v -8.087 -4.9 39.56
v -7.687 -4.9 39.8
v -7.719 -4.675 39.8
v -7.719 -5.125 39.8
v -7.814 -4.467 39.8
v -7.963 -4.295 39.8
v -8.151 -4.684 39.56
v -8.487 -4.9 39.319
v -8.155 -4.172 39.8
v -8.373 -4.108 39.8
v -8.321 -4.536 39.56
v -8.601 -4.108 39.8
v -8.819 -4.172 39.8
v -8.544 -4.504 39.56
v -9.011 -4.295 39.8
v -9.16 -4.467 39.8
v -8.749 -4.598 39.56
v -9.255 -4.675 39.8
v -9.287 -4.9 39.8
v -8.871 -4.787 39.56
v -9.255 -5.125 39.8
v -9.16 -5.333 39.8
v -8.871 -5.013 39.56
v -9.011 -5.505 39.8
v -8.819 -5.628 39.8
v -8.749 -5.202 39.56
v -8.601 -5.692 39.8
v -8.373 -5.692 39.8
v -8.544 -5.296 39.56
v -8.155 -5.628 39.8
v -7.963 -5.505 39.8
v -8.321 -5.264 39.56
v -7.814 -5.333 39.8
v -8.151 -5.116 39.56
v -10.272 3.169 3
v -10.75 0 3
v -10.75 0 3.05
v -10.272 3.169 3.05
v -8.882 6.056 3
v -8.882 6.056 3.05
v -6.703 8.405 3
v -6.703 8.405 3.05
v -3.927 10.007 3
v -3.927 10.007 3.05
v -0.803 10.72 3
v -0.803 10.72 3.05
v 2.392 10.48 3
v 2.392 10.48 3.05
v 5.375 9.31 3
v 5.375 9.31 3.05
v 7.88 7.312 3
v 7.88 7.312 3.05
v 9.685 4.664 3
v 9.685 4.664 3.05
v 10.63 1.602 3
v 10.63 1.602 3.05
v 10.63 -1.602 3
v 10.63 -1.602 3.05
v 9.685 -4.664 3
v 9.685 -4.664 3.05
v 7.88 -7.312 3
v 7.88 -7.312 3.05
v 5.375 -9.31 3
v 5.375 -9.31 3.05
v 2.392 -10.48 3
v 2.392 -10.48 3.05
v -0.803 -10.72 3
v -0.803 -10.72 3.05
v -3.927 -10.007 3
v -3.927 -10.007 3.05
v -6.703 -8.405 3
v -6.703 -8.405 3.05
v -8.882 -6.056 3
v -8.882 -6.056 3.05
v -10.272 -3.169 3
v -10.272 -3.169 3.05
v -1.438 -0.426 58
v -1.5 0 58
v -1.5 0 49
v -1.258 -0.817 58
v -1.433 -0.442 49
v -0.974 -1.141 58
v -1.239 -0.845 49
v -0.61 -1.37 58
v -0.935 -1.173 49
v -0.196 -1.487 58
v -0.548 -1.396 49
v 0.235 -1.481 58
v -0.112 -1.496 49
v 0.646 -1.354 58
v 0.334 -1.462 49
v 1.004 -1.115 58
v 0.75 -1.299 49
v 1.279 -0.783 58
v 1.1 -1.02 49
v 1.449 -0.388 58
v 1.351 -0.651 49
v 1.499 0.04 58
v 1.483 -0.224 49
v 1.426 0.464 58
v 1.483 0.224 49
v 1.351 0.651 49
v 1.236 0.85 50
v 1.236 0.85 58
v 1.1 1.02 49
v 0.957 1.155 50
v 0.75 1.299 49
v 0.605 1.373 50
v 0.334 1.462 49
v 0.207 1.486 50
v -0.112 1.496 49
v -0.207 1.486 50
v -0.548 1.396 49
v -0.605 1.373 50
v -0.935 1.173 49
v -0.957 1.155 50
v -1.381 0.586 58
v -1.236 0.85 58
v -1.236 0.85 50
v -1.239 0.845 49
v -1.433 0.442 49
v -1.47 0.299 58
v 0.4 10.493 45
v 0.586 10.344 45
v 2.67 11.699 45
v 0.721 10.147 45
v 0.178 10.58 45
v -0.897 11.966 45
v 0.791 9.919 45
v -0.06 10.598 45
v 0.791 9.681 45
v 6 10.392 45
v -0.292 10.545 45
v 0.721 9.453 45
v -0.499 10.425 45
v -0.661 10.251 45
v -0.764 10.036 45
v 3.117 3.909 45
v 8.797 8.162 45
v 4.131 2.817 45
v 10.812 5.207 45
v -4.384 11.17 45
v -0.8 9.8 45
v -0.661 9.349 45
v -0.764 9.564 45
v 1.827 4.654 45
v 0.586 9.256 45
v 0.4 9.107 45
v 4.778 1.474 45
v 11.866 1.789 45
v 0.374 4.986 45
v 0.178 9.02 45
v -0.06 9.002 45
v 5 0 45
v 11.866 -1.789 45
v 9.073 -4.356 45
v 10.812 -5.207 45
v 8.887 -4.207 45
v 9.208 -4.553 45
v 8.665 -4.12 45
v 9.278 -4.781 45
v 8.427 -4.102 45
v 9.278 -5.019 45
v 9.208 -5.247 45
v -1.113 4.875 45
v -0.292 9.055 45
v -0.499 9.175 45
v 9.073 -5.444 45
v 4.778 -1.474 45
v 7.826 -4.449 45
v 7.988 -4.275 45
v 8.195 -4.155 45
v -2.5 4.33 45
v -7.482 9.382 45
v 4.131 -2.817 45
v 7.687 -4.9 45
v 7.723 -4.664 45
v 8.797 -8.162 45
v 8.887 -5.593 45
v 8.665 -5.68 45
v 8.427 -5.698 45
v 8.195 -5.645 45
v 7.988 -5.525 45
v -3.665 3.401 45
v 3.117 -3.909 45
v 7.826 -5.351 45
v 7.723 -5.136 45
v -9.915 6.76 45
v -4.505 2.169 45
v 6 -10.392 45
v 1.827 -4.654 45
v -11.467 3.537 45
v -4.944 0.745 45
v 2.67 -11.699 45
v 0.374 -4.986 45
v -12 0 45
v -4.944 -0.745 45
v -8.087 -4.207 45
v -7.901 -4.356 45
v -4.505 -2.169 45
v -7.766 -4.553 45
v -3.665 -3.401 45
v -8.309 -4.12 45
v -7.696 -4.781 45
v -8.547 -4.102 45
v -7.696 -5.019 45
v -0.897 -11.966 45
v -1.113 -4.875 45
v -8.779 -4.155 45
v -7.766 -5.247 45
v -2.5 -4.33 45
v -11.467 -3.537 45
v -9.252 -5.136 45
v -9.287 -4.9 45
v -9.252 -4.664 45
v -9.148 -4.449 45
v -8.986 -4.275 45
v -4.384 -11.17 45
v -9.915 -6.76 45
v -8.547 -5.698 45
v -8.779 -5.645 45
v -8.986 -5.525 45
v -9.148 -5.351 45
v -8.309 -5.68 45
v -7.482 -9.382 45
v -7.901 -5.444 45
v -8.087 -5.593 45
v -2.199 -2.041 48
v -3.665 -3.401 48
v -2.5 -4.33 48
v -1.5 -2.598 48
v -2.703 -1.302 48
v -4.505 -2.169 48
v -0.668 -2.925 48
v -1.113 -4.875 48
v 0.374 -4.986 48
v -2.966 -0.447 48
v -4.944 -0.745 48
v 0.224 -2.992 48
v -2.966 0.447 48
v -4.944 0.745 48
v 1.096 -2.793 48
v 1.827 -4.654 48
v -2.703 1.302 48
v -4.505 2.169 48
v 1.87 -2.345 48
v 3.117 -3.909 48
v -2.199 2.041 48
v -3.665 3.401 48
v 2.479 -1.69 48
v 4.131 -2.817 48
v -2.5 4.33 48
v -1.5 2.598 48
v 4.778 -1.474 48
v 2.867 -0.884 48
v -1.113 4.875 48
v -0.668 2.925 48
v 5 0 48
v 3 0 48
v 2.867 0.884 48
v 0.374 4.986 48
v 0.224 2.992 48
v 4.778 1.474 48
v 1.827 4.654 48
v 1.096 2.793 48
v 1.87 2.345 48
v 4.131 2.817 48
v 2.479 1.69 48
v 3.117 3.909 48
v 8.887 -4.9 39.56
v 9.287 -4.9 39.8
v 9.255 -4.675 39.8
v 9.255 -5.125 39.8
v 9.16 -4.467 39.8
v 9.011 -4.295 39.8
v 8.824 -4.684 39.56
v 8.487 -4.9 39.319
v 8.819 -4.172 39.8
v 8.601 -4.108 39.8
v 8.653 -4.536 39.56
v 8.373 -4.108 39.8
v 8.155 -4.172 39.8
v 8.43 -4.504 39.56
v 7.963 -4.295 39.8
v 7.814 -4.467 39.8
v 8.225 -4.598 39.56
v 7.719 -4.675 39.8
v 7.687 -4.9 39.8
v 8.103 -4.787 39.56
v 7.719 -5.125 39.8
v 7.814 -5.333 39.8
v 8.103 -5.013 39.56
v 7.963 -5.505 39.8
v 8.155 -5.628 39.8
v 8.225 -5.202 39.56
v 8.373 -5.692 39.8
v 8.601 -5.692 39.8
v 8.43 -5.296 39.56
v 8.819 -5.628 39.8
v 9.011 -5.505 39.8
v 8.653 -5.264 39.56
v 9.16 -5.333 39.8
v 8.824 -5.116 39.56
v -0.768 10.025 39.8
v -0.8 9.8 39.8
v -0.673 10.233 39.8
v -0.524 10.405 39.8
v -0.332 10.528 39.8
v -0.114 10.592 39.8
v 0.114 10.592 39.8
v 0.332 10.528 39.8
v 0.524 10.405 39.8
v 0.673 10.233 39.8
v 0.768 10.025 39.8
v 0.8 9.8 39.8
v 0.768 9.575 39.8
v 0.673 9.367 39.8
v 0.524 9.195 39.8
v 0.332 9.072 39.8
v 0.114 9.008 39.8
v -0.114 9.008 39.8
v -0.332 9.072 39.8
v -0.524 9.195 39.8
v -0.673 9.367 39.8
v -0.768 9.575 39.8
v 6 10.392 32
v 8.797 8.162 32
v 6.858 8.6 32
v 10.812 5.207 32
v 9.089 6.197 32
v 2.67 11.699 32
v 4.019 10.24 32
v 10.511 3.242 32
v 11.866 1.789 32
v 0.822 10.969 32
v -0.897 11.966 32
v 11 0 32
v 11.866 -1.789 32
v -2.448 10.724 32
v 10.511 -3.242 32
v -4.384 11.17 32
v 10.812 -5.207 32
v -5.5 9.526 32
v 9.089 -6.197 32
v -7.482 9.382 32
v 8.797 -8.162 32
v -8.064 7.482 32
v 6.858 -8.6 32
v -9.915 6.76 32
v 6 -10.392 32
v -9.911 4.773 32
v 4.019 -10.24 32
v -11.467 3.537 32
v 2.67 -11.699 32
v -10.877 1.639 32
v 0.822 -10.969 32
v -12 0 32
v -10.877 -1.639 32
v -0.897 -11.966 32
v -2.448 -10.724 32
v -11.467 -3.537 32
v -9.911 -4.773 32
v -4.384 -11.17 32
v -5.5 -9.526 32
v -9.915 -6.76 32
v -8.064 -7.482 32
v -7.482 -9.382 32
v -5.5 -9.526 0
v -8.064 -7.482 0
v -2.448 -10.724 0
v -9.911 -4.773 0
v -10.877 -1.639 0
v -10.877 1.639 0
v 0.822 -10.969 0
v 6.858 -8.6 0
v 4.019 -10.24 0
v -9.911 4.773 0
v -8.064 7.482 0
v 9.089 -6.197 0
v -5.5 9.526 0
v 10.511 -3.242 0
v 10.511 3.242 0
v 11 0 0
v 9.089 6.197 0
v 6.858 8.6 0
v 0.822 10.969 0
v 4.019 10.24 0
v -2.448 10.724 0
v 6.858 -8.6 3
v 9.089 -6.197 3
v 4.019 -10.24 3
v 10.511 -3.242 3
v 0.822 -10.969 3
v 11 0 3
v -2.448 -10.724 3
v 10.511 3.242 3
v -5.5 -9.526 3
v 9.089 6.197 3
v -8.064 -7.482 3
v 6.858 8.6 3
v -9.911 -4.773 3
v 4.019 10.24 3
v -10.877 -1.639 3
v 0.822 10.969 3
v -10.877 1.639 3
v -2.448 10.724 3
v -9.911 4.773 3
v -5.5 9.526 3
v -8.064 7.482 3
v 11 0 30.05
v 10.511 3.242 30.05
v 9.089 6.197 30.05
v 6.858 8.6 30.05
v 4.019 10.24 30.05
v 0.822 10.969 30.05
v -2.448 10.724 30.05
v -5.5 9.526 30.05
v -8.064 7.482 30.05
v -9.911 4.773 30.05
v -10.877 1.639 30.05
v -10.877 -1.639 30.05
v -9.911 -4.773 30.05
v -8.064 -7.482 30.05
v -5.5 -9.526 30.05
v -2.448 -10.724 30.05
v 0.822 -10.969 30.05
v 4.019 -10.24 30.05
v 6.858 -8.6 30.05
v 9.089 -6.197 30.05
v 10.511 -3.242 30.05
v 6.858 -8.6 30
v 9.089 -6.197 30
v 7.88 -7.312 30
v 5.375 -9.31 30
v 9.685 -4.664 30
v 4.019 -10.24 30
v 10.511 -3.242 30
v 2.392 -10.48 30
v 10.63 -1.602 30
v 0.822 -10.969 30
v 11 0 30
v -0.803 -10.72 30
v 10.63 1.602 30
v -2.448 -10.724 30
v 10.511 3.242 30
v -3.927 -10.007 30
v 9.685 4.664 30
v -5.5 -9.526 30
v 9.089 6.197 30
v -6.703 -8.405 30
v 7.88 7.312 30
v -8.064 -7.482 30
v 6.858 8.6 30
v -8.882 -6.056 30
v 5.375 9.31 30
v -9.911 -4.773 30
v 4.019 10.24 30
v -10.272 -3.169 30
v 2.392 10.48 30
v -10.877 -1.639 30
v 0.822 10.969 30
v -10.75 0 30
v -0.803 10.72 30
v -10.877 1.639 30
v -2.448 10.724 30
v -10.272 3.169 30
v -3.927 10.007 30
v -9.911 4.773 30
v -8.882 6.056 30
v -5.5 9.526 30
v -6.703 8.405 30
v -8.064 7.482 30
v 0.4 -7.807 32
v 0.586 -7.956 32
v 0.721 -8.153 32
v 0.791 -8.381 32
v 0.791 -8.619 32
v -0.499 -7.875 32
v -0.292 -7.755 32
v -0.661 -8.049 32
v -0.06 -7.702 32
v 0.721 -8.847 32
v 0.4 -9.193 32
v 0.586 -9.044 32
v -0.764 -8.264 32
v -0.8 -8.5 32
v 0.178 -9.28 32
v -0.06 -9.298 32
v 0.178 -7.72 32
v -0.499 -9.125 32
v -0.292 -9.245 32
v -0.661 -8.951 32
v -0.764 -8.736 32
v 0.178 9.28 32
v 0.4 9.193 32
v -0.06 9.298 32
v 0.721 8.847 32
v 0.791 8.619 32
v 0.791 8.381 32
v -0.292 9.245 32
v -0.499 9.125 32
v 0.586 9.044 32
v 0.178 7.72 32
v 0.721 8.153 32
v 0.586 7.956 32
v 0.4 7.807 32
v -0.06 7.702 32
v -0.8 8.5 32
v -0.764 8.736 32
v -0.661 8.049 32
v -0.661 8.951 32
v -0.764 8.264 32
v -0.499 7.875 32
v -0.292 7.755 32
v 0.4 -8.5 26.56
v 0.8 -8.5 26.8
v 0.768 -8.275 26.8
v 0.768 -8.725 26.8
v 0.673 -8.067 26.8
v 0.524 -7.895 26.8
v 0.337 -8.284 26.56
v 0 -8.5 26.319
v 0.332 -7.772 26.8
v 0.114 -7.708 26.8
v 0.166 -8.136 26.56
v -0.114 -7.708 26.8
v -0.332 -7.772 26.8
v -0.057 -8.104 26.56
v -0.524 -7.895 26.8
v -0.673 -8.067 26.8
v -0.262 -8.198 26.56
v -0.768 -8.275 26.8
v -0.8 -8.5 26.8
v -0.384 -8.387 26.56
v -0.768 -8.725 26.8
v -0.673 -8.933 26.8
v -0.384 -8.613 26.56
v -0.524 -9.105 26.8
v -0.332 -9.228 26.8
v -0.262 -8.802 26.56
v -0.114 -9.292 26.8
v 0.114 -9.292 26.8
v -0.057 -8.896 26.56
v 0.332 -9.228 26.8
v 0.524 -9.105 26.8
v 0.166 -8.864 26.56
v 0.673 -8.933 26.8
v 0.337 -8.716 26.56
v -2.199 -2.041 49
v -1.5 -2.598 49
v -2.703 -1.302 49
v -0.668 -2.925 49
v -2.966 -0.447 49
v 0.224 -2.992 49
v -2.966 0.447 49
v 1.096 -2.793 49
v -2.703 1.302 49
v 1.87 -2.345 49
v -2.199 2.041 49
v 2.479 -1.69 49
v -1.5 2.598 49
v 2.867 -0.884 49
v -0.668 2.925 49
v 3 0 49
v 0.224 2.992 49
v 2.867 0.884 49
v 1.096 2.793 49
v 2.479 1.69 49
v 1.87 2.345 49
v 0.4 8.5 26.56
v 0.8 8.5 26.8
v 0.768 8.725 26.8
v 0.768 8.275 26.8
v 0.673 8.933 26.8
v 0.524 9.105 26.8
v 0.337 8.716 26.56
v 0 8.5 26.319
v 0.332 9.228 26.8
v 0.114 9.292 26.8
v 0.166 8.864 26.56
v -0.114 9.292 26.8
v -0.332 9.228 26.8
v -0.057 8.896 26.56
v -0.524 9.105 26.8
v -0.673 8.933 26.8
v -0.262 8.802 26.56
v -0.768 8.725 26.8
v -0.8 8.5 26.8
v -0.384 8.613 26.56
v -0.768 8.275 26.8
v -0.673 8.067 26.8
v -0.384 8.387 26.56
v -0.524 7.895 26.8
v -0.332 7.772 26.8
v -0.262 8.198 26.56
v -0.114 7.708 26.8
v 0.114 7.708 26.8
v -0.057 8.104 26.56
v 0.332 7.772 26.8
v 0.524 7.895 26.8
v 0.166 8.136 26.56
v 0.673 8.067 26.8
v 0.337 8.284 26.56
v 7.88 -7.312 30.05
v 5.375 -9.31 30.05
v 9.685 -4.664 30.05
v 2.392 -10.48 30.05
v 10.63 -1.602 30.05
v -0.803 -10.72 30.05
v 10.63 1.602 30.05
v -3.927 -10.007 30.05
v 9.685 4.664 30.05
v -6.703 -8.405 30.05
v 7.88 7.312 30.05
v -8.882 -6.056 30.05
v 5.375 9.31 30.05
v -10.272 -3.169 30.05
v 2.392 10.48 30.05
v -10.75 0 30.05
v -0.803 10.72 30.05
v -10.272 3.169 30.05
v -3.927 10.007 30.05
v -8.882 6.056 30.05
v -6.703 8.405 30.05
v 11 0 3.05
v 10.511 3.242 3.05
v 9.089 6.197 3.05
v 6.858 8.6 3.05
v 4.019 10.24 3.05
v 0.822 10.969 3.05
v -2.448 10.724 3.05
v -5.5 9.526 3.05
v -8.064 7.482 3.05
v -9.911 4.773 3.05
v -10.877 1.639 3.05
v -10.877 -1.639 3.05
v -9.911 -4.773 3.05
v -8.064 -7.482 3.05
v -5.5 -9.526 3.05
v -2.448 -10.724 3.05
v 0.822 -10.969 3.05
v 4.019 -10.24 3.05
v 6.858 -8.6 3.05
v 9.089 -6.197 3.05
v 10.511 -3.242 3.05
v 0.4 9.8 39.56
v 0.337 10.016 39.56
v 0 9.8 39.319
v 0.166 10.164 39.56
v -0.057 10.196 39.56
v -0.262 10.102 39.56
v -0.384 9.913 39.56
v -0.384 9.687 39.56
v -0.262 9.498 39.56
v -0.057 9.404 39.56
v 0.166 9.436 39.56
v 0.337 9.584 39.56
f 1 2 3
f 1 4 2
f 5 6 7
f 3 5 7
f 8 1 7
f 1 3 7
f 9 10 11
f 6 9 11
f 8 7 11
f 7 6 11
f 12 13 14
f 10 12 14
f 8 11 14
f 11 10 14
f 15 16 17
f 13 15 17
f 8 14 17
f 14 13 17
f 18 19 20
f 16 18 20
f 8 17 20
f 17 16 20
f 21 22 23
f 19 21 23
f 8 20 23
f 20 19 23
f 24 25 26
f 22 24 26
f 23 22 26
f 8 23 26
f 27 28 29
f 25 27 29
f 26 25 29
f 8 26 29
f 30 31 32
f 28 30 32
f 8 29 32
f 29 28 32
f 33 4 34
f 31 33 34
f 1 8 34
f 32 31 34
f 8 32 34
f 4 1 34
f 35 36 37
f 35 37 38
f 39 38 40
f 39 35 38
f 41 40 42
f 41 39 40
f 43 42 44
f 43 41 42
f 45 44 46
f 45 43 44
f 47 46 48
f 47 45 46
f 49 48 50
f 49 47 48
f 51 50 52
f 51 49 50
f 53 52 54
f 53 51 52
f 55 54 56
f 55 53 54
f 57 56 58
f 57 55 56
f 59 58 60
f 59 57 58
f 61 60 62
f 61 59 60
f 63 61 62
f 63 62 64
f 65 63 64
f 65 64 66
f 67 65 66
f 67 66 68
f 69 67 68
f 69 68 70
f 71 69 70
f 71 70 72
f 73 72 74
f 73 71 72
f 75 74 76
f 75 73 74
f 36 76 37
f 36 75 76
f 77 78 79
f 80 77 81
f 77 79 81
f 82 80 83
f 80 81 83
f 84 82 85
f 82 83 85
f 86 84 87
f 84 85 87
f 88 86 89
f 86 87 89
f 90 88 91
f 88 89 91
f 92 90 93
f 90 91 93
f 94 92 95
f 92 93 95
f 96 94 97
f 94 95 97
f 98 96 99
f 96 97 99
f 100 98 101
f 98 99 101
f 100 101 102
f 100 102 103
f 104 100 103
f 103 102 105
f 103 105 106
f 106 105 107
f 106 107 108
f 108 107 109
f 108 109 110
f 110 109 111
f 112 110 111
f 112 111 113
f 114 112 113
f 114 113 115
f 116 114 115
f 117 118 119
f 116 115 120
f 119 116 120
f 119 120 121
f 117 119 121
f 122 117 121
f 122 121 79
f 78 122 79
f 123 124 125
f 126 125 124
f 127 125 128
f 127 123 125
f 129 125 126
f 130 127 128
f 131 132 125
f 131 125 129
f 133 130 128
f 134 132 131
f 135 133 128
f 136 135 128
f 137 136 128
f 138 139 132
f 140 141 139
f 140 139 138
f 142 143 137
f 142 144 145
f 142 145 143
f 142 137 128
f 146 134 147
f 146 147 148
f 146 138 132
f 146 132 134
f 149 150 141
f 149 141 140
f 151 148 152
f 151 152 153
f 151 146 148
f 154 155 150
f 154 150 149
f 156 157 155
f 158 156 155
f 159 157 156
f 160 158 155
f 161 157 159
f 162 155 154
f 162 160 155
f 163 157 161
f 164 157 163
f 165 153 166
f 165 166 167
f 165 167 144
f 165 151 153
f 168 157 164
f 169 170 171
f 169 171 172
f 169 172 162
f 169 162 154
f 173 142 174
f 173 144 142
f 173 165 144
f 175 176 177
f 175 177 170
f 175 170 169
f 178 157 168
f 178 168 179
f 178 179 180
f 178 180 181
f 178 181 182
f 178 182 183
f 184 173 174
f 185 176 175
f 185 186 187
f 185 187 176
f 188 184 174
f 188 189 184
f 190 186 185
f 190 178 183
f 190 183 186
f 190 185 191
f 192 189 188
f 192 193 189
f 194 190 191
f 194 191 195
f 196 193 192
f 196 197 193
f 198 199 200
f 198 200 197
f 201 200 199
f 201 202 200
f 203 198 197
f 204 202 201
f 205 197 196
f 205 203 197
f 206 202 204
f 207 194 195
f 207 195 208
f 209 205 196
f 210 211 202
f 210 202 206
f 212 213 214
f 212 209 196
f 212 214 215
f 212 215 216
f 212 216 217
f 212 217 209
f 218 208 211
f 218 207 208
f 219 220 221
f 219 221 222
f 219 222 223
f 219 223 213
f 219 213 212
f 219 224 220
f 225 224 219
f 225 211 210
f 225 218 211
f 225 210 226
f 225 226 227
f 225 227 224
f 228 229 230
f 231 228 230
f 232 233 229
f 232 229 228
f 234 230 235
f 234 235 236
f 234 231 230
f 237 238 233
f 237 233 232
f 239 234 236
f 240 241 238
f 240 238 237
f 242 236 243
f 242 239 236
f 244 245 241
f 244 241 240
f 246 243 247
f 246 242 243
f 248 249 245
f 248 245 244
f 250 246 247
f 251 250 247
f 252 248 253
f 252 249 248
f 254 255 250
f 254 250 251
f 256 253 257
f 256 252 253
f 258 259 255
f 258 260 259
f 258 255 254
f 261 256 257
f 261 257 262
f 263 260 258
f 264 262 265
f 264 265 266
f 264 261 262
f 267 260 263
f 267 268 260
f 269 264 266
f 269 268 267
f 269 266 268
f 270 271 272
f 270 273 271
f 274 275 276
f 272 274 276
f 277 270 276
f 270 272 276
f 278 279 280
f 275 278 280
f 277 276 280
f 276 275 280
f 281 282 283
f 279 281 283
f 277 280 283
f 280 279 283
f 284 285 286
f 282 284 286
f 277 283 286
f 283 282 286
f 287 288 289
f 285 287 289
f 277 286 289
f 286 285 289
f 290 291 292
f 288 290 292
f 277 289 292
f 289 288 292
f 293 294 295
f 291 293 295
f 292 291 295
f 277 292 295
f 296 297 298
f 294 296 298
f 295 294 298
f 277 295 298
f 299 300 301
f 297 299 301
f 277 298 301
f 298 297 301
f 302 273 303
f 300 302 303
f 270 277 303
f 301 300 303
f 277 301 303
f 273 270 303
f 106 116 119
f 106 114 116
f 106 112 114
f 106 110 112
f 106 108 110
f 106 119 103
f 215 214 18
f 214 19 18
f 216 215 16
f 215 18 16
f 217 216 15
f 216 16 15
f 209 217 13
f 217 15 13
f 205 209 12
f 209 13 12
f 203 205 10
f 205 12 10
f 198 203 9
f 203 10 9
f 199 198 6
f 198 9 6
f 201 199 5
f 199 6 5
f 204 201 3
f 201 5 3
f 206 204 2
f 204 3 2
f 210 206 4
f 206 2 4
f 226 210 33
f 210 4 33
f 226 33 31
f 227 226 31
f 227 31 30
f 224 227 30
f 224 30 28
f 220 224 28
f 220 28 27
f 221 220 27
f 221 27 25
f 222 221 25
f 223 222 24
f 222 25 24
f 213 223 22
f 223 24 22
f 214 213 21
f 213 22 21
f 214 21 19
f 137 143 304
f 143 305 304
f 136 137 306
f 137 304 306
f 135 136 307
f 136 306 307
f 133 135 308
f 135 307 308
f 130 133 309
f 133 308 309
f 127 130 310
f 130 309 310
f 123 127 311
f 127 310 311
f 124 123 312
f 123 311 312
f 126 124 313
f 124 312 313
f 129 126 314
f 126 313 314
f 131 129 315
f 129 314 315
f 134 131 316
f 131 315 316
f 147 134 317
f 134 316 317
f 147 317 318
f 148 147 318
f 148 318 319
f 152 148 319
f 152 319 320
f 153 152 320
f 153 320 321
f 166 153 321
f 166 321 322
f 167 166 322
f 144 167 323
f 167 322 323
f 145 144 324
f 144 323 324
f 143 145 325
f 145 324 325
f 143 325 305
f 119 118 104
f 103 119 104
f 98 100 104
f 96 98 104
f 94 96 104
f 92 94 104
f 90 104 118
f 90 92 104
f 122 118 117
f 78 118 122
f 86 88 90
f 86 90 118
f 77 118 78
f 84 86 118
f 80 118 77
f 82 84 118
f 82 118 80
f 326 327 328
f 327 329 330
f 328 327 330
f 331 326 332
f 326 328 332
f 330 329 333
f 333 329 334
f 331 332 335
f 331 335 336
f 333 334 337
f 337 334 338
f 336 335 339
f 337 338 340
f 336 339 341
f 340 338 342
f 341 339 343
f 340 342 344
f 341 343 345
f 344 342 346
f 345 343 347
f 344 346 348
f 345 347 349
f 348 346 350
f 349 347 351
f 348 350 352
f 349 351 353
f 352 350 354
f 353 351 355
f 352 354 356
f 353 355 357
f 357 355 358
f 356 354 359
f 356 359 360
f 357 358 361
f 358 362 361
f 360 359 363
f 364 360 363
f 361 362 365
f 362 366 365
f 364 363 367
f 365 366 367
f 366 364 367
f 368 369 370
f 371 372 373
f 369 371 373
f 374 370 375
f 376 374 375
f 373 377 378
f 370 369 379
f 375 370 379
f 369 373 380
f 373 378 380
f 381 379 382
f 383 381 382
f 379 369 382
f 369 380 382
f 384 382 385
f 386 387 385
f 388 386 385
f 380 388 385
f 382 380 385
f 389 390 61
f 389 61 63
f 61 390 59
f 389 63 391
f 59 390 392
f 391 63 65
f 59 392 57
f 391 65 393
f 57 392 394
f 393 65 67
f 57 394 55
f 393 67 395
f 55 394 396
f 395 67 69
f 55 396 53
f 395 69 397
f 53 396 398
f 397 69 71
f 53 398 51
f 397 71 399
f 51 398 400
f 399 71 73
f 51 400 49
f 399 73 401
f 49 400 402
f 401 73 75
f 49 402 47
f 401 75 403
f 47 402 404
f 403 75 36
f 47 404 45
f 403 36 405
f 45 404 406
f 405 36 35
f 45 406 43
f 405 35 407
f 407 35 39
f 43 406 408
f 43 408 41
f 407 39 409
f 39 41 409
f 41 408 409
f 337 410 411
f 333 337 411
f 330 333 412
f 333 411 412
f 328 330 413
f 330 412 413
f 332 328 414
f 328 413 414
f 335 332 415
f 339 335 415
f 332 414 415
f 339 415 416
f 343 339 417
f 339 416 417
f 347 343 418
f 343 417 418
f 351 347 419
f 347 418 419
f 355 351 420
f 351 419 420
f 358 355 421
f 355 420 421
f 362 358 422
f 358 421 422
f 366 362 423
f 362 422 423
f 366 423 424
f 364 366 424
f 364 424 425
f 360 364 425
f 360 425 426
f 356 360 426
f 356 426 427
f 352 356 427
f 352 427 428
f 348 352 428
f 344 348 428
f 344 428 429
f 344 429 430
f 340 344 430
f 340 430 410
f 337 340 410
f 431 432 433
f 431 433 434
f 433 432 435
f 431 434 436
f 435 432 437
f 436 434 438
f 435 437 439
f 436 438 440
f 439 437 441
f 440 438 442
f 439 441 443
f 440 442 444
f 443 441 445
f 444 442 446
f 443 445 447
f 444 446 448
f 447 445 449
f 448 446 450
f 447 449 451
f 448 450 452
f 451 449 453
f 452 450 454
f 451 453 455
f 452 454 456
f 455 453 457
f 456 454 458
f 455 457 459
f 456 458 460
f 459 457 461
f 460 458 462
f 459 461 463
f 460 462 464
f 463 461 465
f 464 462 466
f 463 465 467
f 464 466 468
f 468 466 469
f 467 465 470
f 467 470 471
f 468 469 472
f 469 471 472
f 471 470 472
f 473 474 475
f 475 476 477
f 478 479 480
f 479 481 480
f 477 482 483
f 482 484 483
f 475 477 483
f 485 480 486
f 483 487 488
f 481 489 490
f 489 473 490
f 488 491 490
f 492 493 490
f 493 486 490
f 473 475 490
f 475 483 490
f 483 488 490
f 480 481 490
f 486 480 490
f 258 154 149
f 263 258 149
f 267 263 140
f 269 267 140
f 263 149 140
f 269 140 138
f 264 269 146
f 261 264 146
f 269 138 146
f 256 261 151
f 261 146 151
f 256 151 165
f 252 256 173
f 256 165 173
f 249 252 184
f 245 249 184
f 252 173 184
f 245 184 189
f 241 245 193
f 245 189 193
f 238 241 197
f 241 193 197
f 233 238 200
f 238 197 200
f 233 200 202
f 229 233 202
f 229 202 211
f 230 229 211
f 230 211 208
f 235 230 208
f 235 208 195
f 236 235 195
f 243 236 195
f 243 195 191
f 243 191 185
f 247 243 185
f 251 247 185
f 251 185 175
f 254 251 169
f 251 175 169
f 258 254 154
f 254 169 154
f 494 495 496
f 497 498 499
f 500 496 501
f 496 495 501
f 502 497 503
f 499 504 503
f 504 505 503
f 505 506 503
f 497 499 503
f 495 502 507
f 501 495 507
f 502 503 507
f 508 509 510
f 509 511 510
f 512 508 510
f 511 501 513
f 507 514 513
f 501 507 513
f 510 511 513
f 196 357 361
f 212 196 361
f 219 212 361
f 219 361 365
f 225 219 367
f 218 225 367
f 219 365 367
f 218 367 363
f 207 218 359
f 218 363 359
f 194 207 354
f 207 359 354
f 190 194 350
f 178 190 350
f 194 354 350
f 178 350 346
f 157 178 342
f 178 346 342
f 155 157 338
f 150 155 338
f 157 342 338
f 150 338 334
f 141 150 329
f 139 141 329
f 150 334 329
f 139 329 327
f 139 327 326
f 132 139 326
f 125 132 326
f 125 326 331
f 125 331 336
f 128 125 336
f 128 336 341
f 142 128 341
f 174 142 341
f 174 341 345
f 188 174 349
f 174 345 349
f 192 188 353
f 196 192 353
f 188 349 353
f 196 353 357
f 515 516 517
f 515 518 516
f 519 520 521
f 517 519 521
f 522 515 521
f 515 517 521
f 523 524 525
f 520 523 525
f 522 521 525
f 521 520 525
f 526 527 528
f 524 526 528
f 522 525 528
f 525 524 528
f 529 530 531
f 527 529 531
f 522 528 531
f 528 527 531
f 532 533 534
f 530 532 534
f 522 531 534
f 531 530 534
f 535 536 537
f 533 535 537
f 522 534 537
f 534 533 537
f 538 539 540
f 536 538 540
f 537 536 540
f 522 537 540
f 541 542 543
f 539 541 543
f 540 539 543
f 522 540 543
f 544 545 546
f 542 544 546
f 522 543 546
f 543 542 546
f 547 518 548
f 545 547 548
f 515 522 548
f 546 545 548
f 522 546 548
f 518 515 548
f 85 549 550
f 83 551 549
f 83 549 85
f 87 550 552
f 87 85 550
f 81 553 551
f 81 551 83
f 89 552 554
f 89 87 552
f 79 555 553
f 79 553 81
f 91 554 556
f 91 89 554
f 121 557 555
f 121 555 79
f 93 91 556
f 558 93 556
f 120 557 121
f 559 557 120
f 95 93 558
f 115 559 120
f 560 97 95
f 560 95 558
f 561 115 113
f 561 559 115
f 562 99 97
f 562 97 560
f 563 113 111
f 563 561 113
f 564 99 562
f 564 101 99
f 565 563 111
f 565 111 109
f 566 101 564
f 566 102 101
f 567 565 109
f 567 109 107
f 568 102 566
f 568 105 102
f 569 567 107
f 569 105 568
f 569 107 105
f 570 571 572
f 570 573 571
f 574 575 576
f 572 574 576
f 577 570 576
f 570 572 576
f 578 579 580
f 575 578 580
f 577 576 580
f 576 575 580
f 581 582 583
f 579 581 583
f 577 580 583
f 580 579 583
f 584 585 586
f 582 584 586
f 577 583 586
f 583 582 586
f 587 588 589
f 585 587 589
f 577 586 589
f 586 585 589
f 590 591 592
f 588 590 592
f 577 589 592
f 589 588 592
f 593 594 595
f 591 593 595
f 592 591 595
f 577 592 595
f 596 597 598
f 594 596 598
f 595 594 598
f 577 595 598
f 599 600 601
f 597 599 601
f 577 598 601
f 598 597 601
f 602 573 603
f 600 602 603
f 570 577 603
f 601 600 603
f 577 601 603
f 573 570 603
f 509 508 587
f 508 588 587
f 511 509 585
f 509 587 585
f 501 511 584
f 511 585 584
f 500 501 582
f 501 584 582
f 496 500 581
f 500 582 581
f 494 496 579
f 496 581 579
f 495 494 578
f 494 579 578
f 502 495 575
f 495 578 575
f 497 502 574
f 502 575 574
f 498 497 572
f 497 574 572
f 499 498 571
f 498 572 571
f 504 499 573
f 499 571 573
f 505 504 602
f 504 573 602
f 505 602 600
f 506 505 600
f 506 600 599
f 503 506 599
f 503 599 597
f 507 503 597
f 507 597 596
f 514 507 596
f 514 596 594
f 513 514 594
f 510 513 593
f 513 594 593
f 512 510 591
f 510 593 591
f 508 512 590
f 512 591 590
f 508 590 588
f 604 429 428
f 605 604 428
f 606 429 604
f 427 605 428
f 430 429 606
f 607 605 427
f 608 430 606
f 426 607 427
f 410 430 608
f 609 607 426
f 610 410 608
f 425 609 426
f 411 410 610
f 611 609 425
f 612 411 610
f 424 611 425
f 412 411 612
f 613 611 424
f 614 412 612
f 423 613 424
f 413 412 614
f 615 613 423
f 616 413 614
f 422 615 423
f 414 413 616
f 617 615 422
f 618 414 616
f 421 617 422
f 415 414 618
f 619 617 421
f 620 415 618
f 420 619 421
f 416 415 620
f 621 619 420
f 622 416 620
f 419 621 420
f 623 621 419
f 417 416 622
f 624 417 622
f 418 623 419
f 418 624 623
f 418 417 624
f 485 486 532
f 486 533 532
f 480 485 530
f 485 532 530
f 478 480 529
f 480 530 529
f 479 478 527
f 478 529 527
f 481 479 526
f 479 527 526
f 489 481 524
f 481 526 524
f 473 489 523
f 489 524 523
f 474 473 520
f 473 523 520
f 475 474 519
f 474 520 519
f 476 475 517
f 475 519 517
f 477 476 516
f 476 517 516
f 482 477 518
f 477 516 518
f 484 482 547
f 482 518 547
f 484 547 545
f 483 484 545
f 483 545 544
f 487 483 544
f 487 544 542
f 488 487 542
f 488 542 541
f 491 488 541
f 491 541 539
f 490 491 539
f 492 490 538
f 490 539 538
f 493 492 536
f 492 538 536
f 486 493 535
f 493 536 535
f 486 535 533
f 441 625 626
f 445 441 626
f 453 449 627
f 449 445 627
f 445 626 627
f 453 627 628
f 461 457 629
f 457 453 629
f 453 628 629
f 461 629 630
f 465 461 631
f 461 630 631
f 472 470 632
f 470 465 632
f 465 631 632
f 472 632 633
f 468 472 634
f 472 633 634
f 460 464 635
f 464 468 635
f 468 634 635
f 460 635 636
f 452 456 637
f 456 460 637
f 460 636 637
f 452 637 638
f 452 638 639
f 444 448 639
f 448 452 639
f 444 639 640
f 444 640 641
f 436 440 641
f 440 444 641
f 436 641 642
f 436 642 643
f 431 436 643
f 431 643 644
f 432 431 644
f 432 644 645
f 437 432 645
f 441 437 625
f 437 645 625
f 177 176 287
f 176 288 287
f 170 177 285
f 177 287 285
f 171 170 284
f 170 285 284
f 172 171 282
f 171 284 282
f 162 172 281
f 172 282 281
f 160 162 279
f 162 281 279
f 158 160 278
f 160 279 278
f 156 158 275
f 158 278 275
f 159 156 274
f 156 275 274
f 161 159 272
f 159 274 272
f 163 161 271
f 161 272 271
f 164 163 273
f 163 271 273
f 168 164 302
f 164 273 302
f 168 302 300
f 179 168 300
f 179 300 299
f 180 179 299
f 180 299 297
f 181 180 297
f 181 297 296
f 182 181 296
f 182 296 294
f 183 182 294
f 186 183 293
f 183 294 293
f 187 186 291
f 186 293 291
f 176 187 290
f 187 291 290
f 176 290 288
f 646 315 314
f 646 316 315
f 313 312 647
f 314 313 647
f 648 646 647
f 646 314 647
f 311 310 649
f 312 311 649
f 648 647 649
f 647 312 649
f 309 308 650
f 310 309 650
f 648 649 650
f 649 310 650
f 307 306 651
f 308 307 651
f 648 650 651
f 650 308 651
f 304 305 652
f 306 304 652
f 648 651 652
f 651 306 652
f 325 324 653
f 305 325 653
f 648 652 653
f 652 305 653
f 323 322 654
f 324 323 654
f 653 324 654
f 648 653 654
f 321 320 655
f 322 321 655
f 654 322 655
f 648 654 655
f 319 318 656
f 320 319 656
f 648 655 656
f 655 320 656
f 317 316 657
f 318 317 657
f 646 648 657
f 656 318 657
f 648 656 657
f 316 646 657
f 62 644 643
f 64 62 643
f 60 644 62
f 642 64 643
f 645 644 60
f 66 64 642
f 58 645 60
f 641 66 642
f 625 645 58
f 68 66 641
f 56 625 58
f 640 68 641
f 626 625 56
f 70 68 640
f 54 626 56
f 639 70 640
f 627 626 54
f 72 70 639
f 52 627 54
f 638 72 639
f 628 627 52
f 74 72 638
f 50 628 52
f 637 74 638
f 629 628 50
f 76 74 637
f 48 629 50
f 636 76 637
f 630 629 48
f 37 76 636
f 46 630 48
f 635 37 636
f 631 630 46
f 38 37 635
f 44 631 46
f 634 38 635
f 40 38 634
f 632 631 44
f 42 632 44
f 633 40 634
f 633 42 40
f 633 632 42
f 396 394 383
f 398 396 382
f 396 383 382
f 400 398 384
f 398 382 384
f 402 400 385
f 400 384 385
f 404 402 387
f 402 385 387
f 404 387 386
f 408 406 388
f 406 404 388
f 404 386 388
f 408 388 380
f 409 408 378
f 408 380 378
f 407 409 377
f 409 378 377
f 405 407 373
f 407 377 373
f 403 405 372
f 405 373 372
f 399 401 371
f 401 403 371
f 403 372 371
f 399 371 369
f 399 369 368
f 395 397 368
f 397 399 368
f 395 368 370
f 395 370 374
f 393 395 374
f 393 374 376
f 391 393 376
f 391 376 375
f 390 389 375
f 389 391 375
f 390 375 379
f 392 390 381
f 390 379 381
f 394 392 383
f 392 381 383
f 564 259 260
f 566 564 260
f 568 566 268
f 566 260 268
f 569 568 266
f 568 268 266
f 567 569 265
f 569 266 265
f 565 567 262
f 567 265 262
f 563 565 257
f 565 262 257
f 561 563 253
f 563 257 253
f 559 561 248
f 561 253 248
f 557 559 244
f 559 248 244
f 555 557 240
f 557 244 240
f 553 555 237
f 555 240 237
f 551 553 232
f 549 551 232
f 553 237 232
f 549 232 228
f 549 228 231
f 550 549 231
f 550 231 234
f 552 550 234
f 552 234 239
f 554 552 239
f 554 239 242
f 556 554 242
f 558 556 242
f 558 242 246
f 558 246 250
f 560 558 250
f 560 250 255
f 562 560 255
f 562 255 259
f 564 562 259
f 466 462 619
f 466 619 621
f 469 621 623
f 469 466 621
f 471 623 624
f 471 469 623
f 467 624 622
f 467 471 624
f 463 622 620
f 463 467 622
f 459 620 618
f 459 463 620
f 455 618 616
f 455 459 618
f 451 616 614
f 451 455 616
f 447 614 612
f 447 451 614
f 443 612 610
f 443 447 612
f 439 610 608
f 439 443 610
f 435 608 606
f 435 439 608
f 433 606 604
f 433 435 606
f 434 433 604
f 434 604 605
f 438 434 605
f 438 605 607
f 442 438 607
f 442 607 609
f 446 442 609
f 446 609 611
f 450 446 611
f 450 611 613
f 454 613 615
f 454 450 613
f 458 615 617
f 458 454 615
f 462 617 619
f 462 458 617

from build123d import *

# Parameters (mm, degrees)
SKETCH_1_R             = 11
EXTRUDE_1_DEPTH        = 32
HOLE_WIZARD_M2_1_D     = 1.6
HOLE_WIZARD_M2_1_DEPTH = 5.2
HOLE_WIZARD_M2_1_TIP   = 0.480688495
CUT_EXTRUDE_START      = -3
SKETCH_5_R             = 11.838448527
SKETCH_5_R_2           = 10.75
CUT_EXTRUDE_1_DEPTH    = 0.05
CUT_EXTRUDE_START_2    = -30
SKETCH_5_2_R           = 11.838448527
SKETCH_5_2_R_2         = 10.75
CUT_EXTRUDE_2_DEPTH    = 0.05
SKETCH_6_R             = 12
EXTRUDE_2_DEPTH        = 13
SKETCH_7_R             = 5
EXTRUDE_3_DEPTH        = 3
SKETCH_8_R             = 3
EXTRUDE_4_DEPTH        = 4
SKETCH_9_R             = 1.5
EXTRUDE_5_DEPTH        = 13
SKETCH_10_W            = 5.142844332
SKETCH_10_H            = 1.571012966
CUT_EXTRUDE_3_DEPTH    = 8
HOLE_WIZARD_M2_2_D     = 1.6
HOLE_WIZARD_M2_2_DEPTH = 5.2
HOLE_WIZARD_M2_2_TIP   = 0.480688495


with BuildPart() as part:
    # 草图1 → 凸台-拉伸1 (new body)
    with BuildSketch(Plane.XY):
        Circle(SKETCH_1_R)
    extrude(amount=EXTRUDE_1_DEPTH)

    # M2 螺纹孔1
    with Locations(Plane(origin=(0, 8.5, 32), x_dir=(1, 0, 0), z_dir=(0, 0, 1))):
        with Locations((0, 0), (0, -17)):
            Hole(HOLE_WIZARD_M2_1_D / 2, depth=HOLE_WIZARD_M2_1_DEPTH)
            with Locations((0, 0, -(HOLE_WIZARD_M2_1_DEPTH + HOLE_WIZARD_M2_1_TIP / 2))):  # 118° drill point
                Cone(0, HOLE_WIZARD_M2_1_D / 2, HOLE_WIZARD_M2_1_TIP, mode=Mode.SUBTRACT)

    # 草图5 → 切除-拉伸1 (cut)
    with BuildSketch(Plane(origin=(0, 0, 0), x_dir=(-1, 0, 0), z_dir=(0, 0, -1)).offset(CUT_EXTRUDE_START)):
        Circle(SKETCH_5_R)
        Circle(SKETCH_5_R_2, mode=Mode.SUBTRACT)
    extrude(amount=-CUT_EXTRUDE_1_DEPTH, mode=Mode.SUBTRACT)

    # 草图5<2> → 切除-拉伸2 (cut)
    with BuildSketch(Plane(origin=(0, 0, 0), x_dir=(-1, 0, 0), z_dir=(0, 0, -1)).offset(CUT_EXTRUDE_START_2)):
        Circle(SKETCH_5_2_R)
        Circle(SKETCH_5_2_R_2, mode=Mode.SUBTRACT)
    extrude(amount=-CUT_EXTRUDE_2_DEPTH, mode=Mode.SUBTRACT)

    # 草图6 → 凸台-拉伸2 (add)
    with BuildSketch(Plane.XY.offset(32)):
        Circle(SKETCH_6_R)
    extrude(amount=EXTRUDE_2_DEPTH)

    # 草图7 → 凸台-拉伸3 (add)
    with BuildSketch(Plane.XY.offset(45)):
        Circle(SKETCH_7_R)
    extrude(amount=EXTRUDE_3_DEPTH)

    # 草图8 → 凸台-拉伸4 (add)
    with BuildSketch(Plane.XY.offset(45)):
        Circle(SKETCH_8_R)
    extrude(amount=EXTRUDE_4_DEPTH)

    # 草图9 → 凸台-拉伸5 (add)
    with BuildSketch(Plane.XY.offset(45)):
        Circle(SKETCH_9_R)
    extrude(amount=EXTRUDE_5_DEPTH)

    # 草图10 → 切除-拉伸3 (cut)
    with BuildSketch(Plane.XY.offset(58)):
        with Locations((0.334320666, 1.635506483)):
            Rectangle(SKETCH_10_W, SKETCH_10_H)
    extrude(amount=-CUT_EXTRUDE_3_DEPTH, mode=Mode.SUBTRACT)

    # M2 螺纹孔2
    with Locations(Plane(origin=(0, 9.8, 45), x_dir=(1, 0, 0), z_dir=(0, 0, 1))):
        with Locations((0, 0), (8.487048957, -14.7), (-8.487048957, -14.7)):
            Hole(HOLE_WIZARD_M2_2_D / 2, depth=HOLE_WIZARD_M2_2_DEPTH)
            with Locations((0, 0, -(HOLE_WIZARD_M2_2_DEPTH + HOLE_WIZARD_M2_2_TIP / 2))):  # 118° drill point
                Cone(0, HOLE_WIZARD_M2_2_D / 2, HOLE_WIZARD_M2_2_TIP, mode=Mode.SUBTRACT)


solid = part.part
